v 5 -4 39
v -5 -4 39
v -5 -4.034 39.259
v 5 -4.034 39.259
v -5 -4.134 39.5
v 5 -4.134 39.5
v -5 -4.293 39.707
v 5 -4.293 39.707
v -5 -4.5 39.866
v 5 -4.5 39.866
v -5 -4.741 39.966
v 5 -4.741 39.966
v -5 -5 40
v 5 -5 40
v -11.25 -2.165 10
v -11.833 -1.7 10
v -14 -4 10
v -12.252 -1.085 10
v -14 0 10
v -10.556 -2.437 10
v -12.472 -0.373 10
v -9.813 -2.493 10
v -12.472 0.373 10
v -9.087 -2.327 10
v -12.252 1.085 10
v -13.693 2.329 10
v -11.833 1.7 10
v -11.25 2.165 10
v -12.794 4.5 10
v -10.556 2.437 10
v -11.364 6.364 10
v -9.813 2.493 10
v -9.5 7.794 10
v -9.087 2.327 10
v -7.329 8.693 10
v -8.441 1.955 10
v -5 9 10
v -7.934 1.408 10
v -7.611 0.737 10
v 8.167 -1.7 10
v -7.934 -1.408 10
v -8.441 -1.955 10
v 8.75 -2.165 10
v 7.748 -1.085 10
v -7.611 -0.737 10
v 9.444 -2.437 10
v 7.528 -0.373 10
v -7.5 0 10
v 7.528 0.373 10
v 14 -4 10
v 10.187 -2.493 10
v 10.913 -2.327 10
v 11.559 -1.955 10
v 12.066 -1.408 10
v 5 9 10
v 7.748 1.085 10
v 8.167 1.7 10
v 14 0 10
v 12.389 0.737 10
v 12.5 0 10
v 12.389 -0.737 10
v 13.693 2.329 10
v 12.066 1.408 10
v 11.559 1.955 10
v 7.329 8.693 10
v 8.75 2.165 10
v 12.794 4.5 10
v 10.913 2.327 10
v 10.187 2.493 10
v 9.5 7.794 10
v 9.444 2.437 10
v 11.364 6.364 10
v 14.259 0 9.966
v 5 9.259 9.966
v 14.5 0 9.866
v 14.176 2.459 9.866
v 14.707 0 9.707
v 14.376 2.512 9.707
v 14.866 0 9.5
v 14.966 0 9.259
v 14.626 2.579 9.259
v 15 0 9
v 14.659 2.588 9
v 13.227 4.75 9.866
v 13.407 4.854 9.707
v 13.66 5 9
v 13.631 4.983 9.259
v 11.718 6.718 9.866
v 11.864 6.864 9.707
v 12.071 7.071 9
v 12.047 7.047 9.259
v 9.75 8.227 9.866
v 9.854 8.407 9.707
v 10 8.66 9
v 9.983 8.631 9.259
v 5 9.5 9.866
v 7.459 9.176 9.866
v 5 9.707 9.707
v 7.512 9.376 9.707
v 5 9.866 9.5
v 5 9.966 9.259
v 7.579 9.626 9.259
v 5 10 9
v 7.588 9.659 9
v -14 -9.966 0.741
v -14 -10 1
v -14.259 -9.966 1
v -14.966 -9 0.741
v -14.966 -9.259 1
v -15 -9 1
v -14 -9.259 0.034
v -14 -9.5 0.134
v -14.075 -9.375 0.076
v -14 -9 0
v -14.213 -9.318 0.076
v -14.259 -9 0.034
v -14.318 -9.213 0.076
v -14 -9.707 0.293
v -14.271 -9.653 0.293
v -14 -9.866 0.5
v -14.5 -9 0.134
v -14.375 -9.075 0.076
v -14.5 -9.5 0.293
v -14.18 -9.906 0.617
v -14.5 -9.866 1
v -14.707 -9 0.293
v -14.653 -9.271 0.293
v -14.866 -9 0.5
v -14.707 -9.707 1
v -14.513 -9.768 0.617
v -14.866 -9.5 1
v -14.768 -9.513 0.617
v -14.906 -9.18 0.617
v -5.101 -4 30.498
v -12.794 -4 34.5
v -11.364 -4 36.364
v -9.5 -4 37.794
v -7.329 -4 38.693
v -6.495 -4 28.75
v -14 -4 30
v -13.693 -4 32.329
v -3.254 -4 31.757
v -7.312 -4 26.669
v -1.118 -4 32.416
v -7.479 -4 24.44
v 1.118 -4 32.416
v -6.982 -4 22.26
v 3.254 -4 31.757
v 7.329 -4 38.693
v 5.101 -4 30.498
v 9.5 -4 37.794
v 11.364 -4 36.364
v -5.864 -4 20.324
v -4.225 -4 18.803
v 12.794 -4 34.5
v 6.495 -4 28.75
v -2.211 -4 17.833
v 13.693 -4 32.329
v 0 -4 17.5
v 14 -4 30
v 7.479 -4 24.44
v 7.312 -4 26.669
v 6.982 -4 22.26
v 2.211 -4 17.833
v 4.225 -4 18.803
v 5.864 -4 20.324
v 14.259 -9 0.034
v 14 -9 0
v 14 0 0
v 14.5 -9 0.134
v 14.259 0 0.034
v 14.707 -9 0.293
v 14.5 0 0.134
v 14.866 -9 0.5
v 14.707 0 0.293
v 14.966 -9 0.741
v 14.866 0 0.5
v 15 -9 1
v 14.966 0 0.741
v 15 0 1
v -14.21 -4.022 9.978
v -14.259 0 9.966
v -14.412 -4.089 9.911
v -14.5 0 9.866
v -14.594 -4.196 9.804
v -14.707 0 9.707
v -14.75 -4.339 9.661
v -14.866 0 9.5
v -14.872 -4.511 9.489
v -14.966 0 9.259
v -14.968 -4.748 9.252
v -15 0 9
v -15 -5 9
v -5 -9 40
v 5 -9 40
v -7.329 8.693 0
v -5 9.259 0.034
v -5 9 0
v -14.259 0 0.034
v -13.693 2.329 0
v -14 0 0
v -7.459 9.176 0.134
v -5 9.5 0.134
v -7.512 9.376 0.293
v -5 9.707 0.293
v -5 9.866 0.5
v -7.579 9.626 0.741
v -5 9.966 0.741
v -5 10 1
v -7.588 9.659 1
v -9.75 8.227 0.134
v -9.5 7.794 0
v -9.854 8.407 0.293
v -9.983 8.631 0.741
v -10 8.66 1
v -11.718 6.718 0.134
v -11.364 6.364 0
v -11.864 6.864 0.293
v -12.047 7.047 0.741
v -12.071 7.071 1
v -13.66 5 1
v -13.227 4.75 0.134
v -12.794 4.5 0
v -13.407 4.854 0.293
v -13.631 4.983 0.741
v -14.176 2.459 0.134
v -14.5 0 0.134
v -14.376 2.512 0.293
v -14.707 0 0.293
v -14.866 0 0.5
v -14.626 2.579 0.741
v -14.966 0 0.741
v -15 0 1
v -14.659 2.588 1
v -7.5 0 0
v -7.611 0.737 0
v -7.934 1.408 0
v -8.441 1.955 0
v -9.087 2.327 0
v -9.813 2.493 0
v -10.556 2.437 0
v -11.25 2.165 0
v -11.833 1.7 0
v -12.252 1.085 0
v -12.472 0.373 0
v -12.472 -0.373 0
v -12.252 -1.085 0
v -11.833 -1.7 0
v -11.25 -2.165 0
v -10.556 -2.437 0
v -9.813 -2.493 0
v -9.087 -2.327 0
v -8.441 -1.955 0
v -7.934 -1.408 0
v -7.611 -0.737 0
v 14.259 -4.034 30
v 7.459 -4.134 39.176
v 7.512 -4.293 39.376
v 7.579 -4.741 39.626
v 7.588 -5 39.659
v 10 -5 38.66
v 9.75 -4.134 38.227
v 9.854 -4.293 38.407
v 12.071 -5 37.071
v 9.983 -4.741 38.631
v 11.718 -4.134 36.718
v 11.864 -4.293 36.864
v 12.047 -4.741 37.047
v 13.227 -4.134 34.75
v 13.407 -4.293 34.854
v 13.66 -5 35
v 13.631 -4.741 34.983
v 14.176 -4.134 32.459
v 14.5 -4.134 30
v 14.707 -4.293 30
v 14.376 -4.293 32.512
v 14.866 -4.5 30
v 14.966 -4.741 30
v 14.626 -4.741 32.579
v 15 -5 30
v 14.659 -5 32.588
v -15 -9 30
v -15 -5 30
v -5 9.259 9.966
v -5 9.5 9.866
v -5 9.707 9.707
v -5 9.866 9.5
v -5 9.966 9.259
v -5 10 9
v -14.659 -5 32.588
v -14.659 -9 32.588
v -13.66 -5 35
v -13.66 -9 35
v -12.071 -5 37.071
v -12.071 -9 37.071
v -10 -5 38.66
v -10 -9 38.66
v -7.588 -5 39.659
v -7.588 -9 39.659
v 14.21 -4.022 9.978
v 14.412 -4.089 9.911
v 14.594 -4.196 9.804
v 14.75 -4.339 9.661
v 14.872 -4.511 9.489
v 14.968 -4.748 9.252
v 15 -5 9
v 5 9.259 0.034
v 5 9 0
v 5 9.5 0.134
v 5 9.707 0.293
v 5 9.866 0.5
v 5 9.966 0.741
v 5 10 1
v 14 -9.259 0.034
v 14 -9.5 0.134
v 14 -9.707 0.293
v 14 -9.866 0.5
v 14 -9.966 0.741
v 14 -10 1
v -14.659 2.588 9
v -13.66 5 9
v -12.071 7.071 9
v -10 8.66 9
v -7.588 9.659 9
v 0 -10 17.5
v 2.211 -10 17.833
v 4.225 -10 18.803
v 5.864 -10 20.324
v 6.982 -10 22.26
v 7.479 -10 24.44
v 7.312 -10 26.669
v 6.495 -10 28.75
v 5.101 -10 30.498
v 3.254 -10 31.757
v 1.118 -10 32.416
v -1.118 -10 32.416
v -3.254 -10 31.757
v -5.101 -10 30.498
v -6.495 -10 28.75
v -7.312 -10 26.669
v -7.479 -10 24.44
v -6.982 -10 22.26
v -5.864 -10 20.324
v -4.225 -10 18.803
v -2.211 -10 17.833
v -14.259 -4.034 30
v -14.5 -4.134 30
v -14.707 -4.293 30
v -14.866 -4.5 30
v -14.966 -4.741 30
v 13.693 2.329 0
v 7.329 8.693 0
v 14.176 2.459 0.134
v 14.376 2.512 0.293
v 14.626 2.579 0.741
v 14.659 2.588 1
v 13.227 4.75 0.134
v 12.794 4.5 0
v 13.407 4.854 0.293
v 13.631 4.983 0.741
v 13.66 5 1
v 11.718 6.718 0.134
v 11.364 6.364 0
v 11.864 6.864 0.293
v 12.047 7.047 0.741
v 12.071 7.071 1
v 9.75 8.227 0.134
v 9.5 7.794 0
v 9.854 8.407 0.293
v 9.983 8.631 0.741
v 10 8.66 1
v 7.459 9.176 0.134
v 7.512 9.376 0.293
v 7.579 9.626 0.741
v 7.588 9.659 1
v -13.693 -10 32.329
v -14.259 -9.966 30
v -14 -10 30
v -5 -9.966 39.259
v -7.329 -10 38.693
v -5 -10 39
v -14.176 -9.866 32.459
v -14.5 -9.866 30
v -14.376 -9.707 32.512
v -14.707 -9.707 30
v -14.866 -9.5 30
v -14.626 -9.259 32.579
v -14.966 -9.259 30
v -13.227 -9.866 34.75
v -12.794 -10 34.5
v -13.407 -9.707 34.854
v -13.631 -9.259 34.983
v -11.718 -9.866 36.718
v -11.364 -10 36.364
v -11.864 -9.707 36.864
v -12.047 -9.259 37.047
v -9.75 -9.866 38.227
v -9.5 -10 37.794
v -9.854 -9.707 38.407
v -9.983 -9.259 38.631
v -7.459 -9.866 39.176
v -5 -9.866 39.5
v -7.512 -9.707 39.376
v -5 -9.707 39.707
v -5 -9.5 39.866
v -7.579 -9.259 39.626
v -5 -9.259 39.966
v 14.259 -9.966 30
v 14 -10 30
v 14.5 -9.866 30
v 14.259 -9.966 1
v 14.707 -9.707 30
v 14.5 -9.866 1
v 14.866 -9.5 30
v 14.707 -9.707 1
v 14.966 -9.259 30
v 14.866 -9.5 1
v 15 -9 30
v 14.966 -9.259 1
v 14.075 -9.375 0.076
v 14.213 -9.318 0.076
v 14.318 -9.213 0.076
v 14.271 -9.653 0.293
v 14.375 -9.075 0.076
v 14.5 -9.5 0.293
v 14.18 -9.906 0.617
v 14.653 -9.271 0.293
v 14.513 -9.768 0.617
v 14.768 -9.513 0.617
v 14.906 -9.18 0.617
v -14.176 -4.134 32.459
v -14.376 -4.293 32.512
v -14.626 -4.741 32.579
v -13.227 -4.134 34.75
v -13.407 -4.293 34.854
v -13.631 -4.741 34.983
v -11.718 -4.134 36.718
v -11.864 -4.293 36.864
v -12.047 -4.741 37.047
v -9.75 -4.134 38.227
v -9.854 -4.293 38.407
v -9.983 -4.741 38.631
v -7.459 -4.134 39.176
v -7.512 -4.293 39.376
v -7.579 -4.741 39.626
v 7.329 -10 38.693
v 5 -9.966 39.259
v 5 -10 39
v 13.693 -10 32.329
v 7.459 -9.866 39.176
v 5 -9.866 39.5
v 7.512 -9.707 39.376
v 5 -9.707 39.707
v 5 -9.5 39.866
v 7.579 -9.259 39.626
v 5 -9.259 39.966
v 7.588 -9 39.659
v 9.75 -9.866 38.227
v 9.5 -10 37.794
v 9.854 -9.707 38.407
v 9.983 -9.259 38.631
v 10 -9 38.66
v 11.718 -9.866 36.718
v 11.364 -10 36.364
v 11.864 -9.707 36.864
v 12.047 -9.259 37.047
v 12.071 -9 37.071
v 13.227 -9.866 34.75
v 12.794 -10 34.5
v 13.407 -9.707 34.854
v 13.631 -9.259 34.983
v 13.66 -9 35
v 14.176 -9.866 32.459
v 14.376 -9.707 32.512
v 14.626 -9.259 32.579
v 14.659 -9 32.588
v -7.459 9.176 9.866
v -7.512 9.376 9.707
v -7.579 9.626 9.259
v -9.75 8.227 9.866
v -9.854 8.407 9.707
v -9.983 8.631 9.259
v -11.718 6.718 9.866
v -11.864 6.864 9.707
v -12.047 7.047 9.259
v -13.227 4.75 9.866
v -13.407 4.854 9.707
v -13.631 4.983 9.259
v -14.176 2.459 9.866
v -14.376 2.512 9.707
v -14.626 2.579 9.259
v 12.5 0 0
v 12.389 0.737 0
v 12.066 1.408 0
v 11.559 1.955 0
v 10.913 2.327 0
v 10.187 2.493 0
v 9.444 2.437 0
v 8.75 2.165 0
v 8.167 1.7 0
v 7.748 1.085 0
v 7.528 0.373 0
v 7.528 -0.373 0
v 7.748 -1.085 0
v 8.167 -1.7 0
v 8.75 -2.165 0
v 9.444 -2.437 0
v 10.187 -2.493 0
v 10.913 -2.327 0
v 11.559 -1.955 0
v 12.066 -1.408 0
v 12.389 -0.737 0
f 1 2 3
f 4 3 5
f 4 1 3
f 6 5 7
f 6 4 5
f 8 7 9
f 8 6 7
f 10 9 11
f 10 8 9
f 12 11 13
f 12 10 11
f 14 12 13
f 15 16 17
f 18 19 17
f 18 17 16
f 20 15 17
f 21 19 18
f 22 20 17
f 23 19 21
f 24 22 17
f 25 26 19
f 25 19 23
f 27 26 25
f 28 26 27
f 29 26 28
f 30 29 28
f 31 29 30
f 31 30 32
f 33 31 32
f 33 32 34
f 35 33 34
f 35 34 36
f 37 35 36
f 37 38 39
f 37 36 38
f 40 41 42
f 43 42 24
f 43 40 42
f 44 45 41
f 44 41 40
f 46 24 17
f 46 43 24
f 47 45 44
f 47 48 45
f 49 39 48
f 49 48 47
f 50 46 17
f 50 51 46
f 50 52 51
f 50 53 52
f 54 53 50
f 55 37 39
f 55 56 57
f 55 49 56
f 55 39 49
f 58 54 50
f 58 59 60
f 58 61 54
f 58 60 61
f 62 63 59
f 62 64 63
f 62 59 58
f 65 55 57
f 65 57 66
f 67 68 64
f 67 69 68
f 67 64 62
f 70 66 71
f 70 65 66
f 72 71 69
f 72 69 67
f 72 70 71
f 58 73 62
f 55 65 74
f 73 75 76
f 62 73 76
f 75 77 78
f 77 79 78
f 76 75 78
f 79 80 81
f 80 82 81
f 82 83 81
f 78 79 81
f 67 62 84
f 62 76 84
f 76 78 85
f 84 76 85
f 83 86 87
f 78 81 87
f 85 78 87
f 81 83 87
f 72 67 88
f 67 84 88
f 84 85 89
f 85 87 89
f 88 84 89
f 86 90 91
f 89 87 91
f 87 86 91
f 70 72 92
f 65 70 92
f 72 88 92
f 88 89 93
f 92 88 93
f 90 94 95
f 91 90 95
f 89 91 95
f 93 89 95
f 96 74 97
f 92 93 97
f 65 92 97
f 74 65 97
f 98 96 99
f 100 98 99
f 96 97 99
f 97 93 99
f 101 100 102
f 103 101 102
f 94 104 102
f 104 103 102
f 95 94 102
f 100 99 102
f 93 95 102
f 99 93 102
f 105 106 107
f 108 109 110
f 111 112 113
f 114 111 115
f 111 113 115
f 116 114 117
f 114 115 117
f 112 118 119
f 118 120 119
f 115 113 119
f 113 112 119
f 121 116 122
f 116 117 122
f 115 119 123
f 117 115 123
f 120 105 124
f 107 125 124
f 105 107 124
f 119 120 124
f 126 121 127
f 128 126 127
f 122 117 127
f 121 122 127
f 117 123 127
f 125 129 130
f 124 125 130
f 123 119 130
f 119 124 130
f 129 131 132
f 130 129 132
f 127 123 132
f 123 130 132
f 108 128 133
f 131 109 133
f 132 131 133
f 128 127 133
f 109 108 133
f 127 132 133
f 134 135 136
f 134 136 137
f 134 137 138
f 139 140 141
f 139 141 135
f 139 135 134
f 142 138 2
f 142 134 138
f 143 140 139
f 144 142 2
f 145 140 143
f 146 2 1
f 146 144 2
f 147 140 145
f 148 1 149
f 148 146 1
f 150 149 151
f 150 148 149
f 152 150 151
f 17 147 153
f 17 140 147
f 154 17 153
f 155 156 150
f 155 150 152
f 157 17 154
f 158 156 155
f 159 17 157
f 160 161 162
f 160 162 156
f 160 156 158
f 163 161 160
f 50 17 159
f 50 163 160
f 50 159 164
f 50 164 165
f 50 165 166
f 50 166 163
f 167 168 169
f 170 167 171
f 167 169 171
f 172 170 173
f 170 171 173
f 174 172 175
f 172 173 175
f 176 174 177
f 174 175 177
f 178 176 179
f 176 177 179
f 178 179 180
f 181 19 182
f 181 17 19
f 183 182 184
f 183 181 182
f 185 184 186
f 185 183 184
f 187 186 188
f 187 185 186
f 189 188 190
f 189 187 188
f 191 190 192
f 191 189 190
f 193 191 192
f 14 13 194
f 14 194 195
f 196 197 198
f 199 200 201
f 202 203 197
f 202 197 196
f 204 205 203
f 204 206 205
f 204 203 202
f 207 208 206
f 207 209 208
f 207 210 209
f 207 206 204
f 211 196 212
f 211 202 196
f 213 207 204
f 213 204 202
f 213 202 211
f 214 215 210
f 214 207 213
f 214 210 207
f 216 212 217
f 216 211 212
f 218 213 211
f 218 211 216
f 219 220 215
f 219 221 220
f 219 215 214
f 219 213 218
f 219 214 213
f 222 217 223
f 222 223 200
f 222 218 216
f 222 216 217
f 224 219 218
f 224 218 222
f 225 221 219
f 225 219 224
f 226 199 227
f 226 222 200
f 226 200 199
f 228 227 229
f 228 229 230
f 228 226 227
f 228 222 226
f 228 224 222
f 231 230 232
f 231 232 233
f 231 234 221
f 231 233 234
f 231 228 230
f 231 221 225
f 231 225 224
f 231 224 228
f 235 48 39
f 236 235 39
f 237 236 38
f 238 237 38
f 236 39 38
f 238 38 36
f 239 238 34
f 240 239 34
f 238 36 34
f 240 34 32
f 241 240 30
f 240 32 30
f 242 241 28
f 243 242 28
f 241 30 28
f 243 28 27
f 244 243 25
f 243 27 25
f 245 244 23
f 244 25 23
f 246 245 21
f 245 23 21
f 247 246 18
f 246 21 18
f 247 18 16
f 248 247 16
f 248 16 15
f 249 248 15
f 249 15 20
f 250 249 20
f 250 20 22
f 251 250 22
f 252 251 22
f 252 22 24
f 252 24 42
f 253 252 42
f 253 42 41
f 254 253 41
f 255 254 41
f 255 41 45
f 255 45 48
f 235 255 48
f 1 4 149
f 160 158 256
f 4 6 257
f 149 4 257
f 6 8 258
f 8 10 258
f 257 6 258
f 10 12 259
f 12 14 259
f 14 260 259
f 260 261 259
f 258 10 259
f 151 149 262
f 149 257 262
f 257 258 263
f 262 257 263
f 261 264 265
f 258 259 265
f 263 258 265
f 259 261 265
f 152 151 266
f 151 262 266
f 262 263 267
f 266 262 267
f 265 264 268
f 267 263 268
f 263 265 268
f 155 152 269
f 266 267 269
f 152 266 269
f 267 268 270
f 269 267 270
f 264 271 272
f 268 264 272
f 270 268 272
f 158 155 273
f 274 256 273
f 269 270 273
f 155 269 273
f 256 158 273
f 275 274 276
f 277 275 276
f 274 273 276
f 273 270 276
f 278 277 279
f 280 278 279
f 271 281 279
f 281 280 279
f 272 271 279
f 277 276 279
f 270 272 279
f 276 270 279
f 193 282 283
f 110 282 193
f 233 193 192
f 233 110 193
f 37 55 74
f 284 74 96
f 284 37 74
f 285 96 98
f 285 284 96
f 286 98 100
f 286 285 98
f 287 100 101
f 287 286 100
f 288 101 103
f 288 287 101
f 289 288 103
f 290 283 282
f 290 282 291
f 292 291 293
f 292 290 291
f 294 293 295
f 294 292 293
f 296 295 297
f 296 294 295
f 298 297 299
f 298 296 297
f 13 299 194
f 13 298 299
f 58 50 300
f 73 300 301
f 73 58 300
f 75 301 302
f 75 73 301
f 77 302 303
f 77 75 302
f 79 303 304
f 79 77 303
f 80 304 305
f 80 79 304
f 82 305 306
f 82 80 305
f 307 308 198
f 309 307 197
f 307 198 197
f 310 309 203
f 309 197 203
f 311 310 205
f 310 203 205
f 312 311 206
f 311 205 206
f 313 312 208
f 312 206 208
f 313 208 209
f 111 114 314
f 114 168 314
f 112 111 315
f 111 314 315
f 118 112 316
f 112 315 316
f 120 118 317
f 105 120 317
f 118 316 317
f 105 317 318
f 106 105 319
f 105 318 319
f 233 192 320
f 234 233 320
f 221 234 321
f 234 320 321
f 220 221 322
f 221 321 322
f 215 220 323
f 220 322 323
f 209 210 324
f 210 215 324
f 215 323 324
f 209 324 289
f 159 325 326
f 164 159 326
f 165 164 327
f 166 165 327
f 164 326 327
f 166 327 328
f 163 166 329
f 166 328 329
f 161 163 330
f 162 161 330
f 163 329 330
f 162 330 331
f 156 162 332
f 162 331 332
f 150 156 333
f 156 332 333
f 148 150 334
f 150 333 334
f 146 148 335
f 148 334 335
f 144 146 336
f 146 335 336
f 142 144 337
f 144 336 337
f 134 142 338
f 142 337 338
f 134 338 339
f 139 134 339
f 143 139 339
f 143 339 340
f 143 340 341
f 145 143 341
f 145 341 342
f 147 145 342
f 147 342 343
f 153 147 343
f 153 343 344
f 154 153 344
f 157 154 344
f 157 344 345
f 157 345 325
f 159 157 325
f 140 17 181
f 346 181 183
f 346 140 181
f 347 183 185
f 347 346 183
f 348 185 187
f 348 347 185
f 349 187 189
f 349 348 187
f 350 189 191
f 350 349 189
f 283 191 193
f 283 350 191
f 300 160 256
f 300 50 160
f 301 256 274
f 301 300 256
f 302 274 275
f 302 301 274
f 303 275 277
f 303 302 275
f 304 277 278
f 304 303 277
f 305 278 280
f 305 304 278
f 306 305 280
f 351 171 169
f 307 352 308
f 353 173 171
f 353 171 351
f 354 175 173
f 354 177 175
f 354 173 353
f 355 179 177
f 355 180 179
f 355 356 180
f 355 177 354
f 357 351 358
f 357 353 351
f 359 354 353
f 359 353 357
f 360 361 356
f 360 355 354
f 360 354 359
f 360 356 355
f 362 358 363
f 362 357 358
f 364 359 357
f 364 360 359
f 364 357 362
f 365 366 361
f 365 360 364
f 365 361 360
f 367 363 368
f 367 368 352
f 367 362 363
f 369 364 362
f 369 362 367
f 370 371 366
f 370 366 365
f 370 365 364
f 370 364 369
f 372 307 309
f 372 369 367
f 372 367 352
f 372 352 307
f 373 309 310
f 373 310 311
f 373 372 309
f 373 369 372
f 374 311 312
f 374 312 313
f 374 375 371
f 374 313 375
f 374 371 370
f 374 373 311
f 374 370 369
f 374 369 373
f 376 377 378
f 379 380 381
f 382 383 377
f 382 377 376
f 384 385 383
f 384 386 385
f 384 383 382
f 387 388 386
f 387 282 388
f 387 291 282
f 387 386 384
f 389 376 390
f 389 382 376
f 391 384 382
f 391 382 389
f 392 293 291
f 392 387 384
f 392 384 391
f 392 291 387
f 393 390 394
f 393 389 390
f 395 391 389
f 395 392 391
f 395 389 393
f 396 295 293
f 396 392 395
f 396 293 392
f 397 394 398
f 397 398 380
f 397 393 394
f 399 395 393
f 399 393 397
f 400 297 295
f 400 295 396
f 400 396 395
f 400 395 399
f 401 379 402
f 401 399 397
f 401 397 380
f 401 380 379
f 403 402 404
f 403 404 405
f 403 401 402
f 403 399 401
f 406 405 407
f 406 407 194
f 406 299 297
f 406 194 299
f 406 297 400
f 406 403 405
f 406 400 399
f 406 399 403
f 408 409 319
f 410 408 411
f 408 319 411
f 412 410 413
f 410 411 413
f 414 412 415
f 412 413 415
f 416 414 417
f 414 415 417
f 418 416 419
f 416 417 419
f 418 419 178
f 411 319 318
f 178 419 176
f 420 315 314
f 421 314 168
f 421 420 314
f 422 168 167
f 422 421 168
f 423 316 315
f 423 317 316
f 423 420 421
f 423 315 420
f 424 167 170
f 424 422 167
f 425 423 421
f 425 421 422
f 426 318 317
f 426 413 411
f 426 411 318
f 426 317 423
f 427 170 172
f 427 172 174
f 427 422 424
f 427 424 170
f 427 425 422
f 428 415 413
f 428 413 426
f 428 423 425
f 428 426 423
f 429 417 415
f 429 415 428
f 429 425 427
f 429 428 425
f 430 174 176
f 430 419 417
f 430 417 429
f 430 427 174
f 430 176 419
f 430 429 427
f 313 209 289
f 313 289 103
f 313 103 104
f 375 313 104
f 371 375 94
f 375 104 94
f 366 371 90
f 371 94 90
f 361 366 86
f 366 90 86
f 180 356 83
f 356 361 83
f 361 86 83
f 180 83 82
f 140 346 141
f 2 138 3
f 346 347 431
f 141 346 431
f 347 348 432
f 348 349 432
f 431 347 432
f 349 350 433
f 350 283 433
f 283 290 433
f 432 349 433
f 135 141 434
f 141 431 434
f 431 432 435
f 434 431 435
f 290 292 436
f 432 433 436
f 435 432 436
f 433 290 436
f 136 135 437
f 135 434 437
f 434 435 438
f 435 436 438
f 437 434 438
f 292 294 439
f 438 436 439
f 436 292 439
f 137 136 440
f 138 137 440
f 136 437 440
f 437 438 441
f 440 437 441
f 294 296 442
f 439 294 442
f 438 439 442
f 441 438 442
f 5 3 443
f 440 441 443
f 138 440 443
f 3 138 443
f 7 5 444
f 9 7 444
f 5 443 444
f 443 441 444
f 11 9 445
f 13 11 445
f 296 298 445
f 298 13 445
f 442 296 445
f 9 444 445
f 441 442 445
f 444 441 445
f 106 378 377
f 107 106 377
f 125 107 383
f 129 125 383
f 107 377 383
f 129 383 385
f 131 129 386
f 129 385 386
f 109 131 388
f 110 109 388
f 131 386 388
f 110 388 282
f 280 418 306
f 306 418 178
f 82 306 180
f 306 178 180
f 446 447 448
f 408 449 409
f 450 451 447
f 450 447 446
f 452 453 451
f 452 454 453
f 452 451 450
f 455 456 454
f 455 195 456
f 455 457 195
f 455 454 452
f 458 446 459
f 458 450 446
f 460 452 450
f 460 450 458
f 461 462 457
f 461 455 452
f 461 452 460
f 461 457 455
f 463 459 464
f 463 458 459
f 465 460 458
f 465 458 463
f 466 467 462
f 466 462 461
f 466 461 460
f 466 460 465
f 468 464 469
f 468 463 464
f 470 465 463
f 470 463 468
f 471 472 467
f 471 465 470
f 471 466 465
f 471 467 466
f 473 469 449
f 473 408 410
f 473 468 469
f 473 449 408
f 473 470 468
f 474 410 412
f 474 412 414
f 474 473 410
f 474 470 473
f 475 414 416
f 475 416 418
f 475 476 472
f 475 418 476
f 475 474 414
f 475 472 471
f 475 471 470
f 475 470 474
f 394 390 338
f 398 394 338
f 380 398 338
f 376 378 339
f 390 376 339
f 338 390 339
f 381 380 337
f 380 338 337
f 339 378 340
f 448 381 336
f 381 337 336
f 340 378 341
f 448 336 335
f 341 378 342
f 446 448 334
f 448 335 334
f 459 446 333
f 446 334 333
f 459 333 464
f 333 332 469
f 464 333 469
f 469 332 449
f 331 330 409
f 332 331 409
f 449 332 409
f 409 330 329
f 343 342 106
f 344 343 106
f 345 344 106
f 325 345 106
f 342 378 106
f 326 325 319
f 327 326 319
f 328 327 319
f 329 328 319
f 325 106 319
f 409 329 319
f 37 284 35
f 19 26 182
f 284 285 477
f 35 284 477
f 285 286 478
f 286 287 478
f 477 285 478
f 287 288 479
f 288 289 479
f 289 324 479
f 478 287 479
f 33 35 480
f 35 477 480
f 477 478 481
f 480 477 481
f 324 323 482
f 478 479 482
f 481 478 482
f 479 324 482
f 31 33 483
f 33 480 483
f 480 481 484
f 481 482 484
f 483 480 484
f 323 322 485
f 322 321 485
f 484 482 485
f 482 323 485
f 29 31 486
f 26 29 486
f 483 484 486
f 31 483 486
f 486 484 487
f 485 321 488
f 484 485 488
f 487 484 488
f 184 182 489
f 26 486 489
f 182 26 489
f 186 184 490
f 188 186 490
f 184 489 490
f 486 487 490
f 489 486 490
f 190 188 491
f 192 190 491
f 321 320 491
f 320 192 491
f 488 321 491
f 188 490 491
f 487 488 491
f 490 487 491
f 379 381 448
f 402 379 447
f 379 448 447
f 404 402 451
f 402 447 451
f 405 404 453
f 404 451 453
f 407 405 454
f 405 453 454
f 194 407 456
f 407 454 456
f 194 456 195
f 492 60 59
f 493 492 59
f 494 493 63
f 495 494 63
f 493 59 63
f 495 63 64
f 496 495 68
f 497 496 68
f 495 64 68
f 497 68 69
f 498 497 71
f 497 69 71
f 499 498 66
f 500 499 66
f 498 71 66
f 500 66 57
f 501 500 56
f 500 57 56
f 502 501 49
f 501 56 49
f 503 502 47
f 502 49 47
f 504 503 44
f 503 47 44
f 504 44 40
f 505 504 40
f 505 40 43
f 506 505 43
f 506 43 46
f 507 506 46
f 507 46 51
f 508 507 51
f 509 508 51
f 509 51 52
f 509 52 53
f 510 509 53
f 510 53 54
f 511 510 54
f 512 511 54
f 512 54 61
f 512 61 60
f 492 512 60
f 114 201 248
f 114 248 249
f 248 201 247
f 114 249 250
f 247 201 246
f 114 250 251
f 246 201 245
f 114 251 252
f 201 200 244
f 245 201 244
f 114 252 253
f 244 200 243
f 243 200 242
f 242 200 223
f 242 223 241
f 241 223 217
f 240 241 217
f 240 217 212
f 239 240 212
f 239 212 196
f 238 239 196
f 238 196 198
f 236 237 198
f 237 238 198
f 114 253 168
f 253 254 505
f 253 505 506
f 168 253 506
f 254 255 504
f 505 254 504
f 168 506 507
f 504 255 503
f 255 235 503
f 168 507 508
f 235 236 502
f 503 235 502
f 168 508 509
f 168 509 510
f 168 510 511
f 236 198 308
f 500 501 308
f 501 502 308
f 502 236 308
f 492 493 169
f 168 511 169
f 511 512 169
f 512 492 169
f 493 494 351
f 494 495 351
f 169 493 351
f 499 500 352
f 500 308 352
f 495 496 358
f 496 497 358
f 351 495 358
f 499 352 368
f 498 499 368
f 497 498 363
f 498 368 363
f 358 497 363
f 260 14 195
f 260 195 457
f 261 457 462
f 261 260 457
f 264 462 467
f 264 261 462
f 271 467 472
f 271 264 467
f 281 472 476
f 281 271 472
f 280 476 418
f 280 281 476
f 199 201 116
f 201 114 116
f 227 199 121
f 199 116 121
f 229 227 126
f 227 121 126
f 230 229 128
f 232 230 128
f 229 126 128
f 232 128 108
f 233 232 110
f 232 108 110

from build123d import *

# Parameters (mm, degrees)
SKETCH_1_W          = 30
SKETCH_1_H          = 20
EXTRUDE_1_DEPTH     = 10
SKETCH_2_R          = 2.5
CUT_EXTRUDE_1_DEPTH = 21.615528128
SKETCH_3_W          = 30
SKETCH_3_H          = 6
EXTRUDE_2_DEPTH     = 30
SKETCH_4_R          = 7.5
CUT_EXTRUDE_2_DEPTH = 30
FILLET_1_R          = 10
FILLET_2_R          = 10
FILLET_3_R          = 1
FILLET_4_R          = 1


with BuildPart() as part:
    # 草图1 → 凸台-拉伸1 (new body)
    with BuildSketch(Plane.XY):
        Rectangle(SKETCH_1_W, SKETCH_1_H)
    extrude(amount=EXTRUDE_1_DEPTH)

    # 草图2 → 切除-拉伸1 (cut, through all)
    with BuildSketch(Plane.XY.offset(10)):
        with Locations((-10, 0)):
            Circle(SKETCH_2_R)
        with Locations((10, 0)):
            Circle(SKETCH_2_R)
    extrude(amount=-CUT_EXTRUDE_1_DEPTH, mode=Mode.SUBTRACT)

    # 草图3 → 凸台-拉伸2 (add)
    with BuildSketch(Plane.XY.offset(10)):
        with Locations((0, -7)):
            Rectangle(SKETCH_3_W, SKETCH_3_H)
    extrude(amount=EXTRUDE_2_DEPTH)

    # 草图4 → 切除-拉伸2 (cut)
    with BuildSketch(Plane.XZ.offset(10)):
        with Locations(Location((0, 25, 0), (0, 0, 270))):
            Circle(SKETCH_4_R)
    extrude(amount=-CUT_EXTRUDE_2_DEPTH, mode=Mode.SUBTRACT)

    # 圆角1
    fillet_1_edges = [part.edges().sort_by_distance(p)[0] for p in [
        (-15, -7, 40),
        (15, -7, 40),
    ]]
    fillet(fillet_1_edges, radius=FILLET_1_R)

    # 圆角2
    fillet_2_edges = [part.edges().sort_by_distance(p)[0] for p in [
        (-15, 10, 5),
        (15, 10, 5),
    ]]
    fillet(fillet_2_edges, radius=FILLET_2_R)

    # 圆角3
    fillet_3_edges = [part.edges().sort_by_distance(p)[0] for p in [
        (0, -10, 40),
        (0, -10, 0),
        (15, -10, 15),
        (-15, -10, 15),
        (12.071067812, -10, 37.071067812),
        (-12.071067812, -10, 37.071067812),
        (15, -5, 0),
        (0, 10, 0),
        (-15, -5, 0),
        (-12.071067812, 7.071067812, 0),
        (12.071067812, 7.071067812, 0),
    ]]
    fillet(fillet_3_edges, radius=FILLET_3_R)

    # 圆角4
    fillet_4_edges = [part.edges().sort_by_distance(p)[0] for p in [
        (15, -2, 10),
        (0, -4, 40),
        (-15, -4, 20),
        (15, -4, 20),
        (12.071067812, -4, 37.071067812),
        (-12.071067812, -4, 37.071067812),
        (0, 10, 10),
        (-15, -2, 10),
        (-12.071067812, 7.071067812, 10),
        (12.071067812, 7.071067812, 10),
    ]]
    fillet(fillet_4_edges, radius=FILLET_4_R)


solid = part.part
